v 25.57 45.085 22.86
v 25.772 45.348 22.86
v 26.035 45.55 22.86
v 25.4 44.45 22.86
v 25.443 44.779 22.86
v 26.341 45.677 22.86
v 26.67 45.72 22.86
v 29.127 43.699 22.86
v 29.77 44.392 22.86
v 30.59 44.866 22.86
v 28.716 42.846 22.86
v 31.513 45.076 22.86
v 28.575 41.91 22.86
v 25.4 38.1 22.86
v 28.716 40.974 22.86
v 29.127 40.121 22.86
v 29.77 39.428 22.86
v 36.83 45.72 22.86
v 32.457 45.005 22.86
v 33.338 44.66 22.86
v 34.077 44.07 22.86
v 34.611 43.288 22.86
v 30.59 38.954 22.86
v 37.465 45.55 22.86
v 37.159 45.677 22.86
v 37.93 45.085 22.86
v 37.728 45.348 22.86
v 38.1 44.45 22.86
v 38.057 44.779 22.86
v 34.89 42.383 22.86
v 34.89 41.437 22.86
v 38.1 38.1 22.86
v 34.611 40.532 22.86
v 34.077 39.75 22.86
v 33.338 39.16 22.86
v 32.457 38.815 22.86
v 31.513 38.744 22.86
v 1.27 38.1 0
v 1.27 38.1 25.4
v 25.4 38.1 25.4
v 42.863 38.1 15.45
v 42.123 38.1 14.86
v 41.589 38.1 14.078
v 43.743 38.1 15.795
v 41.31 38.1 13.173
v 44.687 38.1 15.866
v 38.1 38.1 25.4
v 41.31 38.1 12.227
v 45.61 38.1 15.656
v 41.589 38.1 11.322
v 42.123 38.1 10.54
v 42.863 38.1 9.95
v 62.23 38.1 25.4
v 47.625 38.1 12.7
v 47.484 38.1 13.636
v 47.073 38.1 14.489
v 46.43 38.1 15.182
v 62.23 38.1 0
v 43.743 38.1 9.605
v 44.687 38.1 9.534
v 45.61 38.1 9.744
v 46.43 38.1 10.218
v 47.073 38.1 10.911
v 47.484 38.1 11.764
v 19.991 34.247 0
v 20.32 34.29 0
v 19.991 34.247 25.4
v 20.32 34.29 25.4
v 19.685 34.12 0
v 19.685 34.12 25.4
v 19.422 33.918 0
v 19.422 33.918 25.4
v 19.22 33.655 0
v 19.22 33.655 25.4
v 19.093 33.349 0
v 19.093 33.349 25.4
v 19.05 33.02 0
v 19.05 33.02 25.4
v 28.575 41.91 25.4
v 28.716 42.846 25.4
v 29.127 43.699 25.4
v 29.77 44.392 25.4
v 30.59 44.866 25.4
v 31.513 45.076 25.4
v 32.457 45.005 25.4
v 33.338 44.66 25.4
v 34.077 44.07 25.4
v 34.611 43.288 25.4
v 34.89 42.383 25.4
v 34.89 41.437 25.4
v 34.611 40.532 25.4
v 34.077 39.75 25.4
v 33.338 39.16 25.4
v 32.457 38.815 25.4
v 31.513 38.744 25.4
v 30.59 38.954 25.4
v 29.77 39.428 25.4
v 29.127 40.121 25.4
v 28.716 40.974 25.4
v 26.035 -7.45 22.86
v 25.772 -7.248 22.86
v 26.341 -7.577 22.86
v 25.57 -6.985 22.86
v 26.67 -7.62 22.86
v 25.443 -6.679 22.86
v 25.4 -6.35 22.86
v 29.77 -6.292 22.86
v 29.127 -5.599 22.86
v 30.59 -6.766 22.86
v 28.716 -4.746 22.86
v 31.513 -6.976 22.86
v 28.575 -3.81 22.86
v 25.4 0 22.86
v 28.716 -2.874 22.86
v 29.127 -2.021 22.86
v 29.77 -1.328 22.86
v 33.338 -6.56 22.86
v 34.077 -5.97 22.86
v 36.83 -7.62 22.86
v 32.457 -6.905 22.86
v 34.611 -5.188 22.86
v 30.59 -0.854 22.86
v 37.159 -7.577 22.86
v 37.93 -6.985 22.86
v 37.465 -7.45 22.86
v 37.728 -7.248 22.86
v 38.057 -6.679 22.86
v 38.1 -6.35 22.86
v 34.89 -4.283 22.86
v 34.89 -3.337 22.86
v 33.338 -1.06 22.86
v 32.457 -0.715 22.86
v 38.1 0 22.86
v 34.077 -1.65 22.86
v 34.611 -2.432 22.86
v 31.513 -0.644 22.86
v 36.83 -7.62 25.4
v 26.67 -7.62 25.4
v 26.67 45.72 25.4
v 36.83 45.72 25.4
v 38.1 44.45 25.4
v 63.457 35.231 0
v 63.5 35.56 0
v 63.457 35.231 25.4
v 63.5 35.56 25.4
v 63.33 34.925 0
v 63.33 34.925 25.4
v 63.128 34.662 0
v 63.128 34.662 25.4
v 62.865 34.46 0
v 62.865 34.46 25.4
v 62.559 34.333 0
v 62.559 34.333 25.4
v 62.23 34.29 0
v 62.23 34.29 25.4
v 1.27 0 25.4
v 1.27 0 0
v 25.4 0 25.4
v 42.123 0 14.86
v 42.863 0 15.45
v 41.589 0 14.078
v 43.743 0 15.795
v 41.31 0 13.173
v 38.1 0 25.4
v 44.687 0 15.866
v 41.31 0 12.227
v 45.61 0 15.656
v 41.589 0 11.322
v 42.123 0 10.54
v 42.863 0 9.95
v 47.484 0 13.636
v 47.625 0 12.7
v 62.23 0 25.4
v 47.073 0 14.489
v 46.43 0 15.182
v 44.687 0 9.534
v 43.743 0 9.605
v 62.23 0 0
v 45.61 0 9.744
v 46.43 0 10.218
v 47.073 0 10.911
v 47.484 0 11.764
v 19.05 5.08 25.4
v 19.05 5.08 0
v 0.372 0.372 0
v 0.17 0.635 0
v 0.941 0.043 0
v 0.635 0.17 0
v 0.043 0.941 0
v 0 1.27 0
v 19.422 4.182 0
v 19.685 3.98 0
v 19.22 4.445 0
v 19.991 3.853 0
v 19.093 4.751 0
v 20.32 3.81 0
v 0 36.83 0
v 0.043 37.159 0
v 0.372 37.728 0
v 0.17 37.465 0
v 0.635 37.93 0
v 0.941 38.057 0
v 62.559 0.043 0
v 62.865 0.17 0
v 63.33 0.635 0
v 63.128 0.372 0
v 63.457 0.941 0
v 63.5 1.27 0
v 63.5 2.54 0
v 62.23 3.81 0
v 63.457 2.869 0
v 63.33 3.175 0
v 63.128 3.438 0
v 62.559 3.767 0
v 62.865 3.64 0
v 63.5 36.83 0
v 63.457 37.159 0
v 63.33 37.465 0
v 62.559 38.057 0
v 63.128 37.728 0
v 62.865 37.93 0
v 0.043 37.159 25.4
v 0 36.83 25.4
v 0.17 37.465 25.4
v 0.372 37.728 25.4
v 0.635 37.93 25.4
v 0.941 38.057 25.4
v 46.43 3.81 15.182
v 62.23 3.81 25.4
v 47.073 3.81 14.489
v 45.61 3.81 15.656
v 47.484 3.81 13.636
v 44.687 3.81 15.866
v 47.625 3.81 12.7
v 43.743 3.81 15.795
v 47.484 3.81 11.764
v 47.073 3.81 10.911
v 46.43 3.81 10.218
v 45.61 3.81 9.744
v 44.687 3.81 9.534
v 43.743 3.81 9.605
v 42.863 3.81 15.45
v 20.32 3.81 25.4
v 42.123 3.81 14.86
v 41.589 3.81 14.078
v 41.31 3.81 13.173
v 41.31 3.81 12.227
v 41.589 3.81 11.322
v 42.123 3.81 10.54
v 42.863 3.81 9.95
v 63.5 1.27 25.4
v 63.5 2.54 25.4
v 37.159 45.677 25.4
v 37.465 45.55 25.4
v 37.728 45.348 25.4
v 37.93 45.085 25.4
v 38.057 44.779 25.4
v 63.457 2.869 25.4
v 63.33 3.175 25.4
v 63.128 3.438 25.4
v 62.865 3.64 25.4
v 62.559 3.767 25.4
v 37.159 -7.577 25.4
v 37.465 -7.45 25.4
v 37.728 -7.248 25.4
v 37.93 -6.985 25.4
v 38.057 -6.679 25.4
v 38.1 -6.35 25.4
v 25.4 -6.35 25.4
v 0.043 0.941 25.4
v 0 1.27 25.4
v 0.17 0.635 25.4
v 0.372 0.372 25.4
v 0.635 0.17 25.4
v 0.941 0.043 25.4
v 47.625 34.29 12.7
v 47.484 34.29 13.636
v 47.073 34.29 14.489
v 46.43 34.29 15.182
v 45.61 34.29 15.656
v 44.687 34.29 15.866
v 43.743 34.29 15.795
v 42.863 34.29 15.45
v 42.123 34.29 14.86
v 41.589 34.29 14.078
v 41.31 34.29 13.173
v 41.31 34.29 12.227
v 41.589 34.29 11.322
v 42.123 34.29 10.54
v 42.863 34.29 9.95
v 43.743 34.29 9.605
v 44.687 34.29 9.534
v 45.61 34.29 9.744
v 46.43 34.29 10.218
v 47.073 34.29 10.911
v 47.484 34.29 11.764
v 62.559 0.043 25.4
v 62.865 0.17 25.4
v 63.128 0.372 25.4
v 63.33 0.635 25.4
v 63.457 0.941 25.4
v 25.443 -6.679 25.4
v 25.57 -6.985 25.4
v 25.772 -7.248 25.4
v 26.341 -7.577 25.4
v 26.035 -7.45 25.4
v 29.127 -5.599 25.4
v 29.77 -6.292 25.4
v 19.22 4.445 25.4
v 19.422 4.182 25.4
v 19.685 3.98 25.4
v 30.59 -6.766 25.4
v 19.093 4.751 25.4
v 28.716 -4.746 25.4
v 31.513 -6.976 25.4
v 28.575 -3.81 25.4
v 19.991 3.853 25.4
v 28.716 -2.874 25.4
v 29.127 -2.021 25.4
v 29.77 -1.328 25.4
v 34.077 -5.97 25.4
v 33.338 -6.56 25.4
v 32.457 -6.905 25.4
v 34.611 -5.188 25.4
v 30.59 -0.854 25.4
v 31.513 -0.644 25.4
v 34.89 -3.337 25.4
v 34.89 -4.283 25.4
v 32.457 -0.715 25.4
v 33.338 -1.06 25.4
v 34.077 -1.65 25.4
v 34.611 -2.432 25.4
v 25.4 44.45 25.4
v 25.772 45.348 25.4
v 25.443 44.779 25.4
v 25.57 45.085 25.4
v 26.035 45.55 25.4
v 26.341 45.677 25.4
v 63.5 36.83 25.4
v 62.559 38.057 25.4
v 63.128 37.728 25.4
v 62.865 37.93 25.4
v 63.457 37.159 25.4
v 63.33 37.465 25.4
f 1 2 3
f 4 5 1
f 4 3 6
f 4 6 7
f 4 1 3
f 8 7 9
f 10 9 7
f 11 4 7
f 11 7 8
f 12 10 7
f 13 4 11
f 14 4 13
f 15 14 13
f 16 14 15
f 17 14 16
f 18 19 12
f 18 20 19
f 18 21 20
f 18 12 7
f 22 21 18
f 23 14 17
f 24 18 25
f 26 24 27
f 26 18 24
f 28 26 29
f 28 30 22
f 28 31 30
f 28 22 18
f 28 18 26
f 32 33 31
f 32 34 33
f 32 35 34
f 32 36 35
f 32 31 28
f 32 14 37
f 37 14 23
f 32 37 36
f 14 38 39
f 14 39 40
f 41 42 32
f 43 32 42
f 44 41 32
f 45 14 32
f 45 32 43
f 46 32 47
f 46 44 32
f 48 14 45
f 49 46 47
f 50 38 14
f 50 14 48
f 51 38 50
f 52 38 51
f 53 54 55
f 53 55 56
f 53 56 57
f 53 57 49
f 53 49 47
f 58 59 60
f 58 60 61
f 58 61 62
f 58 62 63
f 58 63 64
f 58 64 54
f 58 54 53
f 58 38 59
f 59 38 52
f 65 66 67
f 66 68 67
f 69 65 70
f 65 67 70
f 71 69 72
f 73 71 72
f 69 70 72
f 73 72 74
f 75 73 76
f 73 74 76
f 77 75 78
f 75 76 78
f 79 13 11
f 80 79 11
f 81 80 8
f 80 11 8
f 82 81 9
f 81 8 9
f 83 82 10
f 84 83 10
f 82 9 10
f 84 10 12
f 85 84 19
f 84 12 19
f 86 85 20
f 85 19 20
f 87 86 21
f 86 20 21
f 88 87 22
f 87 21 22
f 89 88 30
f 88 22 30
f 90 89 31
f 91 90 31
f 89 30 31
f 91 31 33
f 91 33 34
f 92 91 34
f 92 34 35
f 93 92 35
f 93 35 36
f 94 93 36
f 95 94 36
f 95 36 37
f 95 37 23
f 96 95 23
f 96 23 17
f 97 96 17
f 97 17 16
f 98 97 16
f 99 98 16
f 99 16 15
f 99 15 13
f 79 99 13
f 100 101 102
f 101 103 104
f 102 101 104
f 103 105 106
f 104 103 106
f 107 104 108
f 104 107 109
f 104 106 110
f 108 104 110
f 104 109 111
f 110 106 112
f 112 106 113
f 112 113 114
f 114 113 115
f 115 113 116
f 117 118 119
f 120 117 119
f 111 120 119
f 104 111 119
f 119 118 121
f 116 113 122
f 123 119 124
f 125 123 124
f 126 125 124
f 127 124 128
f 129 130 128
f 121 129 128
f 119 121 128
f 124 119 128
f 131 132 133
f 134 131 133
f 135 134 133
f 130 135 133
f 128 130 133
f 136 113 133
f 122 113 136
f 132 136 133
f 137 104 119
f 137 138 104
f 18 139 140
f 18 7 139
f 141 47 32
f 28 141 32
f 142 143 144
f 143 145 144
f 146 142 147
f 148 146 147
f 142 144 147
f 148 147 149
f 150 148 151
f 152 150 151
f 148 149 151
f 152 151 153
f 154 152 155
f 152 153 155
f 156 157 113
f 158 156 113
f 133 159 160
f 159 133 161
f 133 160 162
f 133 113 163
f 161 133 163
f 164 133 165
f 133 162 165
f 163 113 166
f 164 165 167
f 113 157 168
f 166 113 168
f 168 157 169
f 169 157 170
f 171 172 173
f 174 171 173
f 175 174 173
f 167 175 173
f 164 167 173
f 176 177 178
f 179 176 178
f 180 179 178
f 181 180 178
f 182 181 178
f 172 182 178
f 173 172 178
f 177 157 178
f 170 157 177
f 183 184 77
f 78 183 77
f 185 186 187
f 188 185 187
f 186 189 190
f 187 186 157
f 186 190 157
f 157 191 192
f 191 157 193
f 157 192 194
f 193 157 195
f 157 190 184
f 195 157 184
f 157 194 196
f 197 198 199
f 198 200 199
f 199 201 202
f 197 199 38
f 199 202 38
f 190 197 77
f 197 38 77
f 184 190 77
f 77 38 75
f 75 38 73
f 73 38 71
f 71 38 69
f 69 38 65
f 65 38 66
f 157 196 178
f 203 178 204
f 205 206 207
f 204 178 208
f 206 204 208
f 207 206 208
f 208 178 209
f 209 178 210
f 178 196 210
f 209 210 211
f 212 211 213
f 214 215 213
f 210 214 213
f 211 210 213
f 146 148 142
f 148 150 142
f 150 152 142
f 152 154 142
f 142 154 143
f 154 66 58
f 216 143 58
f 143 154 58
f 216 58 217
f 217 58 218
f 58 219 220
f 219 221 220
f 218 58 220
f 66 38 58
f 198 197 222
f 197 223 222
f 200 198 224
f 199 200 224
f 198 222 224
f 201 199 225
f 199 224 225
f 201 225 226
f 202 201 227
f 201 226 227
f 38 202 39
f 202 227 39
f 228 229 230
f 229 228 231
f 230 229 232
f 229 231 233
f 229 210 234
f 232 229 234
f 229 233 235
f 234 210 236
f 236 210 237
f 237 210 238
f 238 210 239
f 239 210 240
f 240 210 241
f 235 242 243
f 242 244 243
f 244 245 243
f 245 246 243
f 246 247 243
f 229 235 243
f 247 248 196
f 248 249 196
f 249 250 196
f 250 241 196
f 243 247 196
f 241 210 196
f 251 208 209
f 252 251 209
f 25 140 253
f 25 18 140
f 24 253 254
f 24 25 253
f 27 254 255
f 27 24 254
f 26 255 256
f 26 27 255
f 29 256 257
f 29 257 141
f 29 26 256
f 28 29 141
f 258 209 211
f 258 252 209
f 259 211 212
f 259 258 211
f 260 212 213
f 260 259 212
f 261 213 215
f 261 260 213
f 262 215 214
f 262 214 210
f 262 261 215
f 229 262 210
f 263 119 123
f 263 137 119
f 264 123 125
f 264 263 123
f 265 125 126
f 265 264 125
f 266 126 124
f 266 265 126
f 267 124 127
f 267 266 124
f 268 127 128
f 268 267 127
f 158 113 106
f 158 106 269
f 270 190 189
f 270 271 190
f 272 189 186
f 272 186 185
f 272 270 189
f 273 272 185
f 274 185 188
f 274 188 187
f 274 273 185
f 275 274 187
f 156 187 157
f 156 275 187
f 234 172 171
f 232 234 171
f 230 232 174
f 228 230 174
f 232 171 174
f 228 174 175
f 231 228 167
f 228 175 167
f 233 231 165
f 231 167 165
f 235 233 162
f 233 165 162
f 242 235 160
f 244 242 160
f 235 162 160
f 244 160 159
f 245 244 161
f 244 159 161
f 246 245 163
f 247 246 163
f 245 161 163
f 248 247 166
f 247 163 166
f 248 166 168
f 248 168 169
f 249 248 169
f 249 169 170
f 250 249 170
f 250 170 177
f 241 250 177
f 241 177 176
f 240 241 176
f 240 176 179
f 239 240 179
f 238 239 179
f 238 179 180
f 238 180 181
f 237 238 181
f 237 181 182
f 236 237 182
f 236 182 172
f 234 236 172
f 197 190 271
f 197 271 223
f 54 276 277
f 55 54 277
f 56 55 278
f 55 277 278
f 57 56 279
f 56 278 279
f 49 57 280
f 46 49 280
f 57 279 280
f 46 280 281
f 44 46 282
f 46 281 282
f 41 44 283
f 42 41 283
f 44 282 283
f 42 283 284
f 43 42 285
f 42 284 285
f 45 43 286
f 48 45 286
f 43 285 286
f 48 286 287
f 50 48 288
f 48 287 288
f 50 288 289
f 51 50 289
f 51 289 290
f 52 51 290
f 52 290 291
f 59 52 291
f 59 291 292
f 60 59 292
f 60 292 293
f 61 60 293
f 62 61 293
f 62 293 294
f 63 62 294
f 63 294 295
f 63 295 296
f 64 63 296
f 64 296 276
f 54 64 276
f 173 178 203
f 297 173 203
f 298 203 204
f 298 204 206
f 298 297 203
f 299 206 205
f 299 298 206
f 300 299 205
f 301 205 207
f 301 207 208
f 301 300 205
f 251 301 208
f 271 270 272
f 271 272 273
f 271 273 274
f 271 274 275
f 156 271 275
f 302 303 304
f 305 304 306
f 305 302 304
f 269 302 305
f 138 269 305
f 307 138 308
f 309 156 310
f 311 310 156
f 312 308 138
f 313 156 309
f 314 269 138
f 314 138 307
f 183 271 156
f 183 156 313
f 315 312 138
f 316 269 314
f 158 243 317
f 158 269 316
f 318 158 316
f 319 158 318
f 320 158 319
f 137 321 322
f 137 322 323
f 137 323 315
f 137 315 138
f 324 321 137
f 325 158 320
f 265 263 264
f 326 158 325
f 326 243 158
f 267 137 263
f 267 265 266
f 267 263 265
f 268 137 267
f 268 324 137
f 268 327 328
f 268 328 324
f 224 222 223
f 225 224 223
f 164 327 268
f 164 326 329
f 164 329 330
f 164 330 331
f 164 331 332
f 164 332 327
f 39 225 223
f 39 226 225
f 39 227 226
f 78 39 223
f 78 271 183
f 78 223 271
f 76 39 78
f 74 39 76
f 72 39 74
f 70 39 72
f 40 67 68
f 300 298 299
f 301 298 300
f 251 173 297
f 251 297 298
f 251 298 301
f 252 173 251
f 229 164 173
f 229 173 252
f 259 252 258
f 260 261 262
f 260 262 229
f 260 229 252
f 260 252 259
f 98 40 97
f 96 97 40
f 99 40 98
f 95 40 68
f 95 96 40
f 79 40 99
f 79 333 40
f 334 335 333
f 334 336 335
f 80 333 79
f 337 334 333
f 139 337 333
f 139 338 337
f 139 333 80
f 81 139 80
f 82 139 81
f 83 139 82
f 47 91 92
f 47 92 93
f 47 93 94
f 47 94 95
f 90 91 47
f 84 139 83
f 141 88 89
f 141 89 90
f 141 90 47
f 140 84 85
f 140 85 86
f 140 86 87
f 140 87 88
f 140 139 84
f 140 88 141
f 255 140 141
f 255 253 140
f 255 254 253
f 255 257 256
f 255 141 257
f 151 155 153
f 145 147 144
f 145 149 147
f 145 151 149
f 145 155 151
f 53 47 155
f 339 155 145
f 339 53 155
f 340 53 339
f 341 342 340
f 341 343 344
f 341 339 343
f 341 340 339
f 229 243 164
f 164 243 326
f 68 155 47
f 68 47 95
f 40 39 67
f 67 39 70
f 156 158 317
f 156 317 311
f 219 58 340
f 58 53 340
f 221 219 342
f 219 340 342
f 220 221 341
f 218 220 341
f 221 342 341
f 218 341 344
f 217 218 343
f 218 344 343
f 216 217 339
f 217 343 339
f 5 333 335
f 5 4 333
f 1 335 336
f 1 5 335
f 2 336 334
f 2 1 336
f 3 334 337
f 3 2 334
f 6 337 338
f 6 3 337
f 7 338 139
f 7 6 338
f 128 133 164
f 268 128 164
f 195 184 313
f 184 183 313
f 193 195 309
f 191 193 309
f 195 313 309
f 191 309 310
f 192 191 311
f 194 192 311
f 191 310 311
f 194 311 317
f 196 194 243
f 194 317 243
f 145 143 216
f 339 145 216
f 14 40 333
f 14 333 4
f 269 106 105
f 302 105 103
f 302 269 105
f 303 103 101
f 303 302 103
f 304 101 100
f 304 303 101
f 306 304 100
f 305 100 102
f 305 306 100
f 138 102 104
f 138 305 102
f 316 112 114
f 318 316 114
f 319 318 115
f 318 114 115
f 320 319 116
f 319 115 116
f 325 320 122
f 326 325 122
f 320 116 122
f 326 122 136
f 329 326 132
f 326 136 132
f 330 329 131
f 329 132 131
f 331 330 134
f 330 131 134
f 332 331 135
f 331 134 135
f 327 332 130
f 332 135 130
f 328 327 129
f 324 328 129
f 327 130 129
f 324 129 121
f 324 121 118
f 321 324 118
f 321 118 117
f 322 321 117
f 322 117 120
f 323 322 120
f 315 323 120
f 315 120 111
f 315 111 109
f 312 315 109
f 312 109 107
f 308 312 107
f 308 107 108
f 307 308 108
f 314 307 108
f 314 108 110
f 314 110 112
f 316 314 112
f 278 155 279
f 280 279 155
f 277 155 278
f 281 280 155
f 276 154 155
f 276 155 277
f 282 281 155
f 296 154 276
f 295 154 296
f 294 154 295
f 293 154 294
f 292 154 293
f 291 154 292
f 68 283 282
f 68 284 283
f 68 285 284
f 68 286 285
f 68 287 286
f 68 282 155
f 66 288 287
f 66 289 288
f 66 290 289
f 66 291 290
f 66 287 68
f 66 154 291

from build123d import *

# Parameters (mm, degrees)
SKETCH1_W           = 63.5
SKETCH1_H           = 38.1
BOSS_EXTRUDE1_DEPTH = 25.4
SKETCH3_W           = 44.45
SKETCH3_H           = 30.48
CUT_EXTRUDE1_DEPTH  = 38.1
SKETCH5_R           = 3.175
CUT_EXTRUDE2_DEPTH  = 76.2
FILLET3_R           = 1.27
SKETCH6_W           = 12.7
SKETCH6_H           = 2.54
BOSS_EXTRUDE2_DEPTH = 7.62
SKETCH7_W           = 12.7
SKETCH7_H           = 2.54
BOSS_EXTRUDE3_DEPTH = 7.62
CUT_EXTRUDE3_REACH  = 4.54
SKETCH8_R           = 3.175
CUT_EXTRUDE4_REACH  = 4.54
SKETCH9_R           = 3.175
FILLET4_R           = 1.27


with BuildPart() as part:
    # Sketch1 → Boss-Extrude1 (new body)
    with BuildSketch(Plane.XY):
        with Locations((31.75, 19.05)):
            Rectangle(SKETCH1_W, SKETCH1_H)
    extrude(amount=BOSS_EXTRUDE1_DEPTH)

    # Sketch3 → Cut-Extrude1 (cut)
    with BuildSketch(Plane(origin=(0, 0, 0), x_dir=(-1, 0, 0), z_dir=(0, 0, -1))):
        with Locations((-41.275, 19.05)):
            Rectangle(SKETCH3_W, SKETCH3_H)
    extrude(amount=-CUT_EXTRUDE1_DEPTH, mode=Mode.SUBTRACT)

    # Sketch5 → Cut-Extrude2 (cut)
    with BuildSketch(Plane.XZ):
        with Locations((44.45, 12.7)):
            Circle(SKETCH5_R)
    extrude(amount=-CUT_EXTRUDE2_DEPTH, mode=Mode.SUBTRACT)

    # Fillet3
    fillet3_edges = [part.edges().sort_by_distance(p)[0] for p in [
        (63.5, 3.81, 12.7),
        (63.5, 34.29, 12.7),
        (19.05, 34.29, 12.7),
        (19.05, 3.81, 12.7),
        (0, 38.1, 12.7),
        (63.5, 38.1, 12.7),
        (63.5, 0, 12.7),
        (0, 0, 12.7),
    ]]
    fillet(fillet3_edges, radius=FILLET3_R)

    # Sketch6 → Boss-Extrude2 (add)
    with BuildSketch(Plane(origin=(0, 38.1, 0), x_dir=(1, 0, 0), z_dir=(0, 1, 0))):
        with Locations((31.75, -24.13)):
            Rectangle(SKETCH6_W, SKETCH6_H)
    extrude(amount=BOSS_EXTRUDE2_DEPTH)

    # Sketch7 → Boss-Extrude3 (add)
    with BuildSketch(Plane.XZ):
        with Locations((31.75, 24.13)):
            Rectangle(SKETCH7_W, SKETCH7_H)
    extrude(amount=BOSS_EXTRUDE3_DEPTH)

    # Sketch8 → Cut-Extrude3 (cut, up to next)
    with BuildSketch(Plane(origin=(0, 0, 22.86), x_dir=(-1, 0, 0), z_dir=(0, 0, -1)), mode=Mode.PRIVATE) as cut_extrude3_sk1:
        with Locations((-31.75, -3.81)):
            Circle(SKETCH8_R)
    cut_extrude3_tool1 = extrude(cut_extrude3_sk1.sketch, amount=-CUT_EXTRUDE3_REACH, mode=Mode.PRIVATE) & part.part
    add(cut_extrude3_tool1.solids().sort_by_distance((31.75, -3.81, 22.86))[0], mode=Mode.SUBTRACT)

    # Sketch9 → Cut-Extrude4 (cut, up to next)
    with BuildSketch(Plane(origin=(0, 0, 22.86), x_dir=(-1, 0, 0), z_dir=(0, 0, -1)), mode=Mode.PRIVATE) as cut_extrude4_sk1:
        with Locations((-31.75, 41.91)):
            Circle(SKETCH9_R)
    cut_extrude4_tool1 = extrude(cut_extrude4_sk1.sketch, amount=-CUT_EXTRUDE4_REACH, mode=Mode.PRIVATE) & part.part
    add(cut_extrude4_tool1.solids().sort_by_distance((31.75, 41.91, 22.86))[0], mode=Mode.SUBTRACT)

    # Fillet4
    fillet4_edges = [part.edges().sort_by_distance(p)[0] for p in [
        (25.4, -7.62, 24.13),
        (38.1, -7.62, 24.13),
        (25.4, 45.72, 24.13),
        (38.1, 45.72, 24.13),
    ]]
    fillet(fillet4_edges, radius=FILLET4_R)


solid = part.part
